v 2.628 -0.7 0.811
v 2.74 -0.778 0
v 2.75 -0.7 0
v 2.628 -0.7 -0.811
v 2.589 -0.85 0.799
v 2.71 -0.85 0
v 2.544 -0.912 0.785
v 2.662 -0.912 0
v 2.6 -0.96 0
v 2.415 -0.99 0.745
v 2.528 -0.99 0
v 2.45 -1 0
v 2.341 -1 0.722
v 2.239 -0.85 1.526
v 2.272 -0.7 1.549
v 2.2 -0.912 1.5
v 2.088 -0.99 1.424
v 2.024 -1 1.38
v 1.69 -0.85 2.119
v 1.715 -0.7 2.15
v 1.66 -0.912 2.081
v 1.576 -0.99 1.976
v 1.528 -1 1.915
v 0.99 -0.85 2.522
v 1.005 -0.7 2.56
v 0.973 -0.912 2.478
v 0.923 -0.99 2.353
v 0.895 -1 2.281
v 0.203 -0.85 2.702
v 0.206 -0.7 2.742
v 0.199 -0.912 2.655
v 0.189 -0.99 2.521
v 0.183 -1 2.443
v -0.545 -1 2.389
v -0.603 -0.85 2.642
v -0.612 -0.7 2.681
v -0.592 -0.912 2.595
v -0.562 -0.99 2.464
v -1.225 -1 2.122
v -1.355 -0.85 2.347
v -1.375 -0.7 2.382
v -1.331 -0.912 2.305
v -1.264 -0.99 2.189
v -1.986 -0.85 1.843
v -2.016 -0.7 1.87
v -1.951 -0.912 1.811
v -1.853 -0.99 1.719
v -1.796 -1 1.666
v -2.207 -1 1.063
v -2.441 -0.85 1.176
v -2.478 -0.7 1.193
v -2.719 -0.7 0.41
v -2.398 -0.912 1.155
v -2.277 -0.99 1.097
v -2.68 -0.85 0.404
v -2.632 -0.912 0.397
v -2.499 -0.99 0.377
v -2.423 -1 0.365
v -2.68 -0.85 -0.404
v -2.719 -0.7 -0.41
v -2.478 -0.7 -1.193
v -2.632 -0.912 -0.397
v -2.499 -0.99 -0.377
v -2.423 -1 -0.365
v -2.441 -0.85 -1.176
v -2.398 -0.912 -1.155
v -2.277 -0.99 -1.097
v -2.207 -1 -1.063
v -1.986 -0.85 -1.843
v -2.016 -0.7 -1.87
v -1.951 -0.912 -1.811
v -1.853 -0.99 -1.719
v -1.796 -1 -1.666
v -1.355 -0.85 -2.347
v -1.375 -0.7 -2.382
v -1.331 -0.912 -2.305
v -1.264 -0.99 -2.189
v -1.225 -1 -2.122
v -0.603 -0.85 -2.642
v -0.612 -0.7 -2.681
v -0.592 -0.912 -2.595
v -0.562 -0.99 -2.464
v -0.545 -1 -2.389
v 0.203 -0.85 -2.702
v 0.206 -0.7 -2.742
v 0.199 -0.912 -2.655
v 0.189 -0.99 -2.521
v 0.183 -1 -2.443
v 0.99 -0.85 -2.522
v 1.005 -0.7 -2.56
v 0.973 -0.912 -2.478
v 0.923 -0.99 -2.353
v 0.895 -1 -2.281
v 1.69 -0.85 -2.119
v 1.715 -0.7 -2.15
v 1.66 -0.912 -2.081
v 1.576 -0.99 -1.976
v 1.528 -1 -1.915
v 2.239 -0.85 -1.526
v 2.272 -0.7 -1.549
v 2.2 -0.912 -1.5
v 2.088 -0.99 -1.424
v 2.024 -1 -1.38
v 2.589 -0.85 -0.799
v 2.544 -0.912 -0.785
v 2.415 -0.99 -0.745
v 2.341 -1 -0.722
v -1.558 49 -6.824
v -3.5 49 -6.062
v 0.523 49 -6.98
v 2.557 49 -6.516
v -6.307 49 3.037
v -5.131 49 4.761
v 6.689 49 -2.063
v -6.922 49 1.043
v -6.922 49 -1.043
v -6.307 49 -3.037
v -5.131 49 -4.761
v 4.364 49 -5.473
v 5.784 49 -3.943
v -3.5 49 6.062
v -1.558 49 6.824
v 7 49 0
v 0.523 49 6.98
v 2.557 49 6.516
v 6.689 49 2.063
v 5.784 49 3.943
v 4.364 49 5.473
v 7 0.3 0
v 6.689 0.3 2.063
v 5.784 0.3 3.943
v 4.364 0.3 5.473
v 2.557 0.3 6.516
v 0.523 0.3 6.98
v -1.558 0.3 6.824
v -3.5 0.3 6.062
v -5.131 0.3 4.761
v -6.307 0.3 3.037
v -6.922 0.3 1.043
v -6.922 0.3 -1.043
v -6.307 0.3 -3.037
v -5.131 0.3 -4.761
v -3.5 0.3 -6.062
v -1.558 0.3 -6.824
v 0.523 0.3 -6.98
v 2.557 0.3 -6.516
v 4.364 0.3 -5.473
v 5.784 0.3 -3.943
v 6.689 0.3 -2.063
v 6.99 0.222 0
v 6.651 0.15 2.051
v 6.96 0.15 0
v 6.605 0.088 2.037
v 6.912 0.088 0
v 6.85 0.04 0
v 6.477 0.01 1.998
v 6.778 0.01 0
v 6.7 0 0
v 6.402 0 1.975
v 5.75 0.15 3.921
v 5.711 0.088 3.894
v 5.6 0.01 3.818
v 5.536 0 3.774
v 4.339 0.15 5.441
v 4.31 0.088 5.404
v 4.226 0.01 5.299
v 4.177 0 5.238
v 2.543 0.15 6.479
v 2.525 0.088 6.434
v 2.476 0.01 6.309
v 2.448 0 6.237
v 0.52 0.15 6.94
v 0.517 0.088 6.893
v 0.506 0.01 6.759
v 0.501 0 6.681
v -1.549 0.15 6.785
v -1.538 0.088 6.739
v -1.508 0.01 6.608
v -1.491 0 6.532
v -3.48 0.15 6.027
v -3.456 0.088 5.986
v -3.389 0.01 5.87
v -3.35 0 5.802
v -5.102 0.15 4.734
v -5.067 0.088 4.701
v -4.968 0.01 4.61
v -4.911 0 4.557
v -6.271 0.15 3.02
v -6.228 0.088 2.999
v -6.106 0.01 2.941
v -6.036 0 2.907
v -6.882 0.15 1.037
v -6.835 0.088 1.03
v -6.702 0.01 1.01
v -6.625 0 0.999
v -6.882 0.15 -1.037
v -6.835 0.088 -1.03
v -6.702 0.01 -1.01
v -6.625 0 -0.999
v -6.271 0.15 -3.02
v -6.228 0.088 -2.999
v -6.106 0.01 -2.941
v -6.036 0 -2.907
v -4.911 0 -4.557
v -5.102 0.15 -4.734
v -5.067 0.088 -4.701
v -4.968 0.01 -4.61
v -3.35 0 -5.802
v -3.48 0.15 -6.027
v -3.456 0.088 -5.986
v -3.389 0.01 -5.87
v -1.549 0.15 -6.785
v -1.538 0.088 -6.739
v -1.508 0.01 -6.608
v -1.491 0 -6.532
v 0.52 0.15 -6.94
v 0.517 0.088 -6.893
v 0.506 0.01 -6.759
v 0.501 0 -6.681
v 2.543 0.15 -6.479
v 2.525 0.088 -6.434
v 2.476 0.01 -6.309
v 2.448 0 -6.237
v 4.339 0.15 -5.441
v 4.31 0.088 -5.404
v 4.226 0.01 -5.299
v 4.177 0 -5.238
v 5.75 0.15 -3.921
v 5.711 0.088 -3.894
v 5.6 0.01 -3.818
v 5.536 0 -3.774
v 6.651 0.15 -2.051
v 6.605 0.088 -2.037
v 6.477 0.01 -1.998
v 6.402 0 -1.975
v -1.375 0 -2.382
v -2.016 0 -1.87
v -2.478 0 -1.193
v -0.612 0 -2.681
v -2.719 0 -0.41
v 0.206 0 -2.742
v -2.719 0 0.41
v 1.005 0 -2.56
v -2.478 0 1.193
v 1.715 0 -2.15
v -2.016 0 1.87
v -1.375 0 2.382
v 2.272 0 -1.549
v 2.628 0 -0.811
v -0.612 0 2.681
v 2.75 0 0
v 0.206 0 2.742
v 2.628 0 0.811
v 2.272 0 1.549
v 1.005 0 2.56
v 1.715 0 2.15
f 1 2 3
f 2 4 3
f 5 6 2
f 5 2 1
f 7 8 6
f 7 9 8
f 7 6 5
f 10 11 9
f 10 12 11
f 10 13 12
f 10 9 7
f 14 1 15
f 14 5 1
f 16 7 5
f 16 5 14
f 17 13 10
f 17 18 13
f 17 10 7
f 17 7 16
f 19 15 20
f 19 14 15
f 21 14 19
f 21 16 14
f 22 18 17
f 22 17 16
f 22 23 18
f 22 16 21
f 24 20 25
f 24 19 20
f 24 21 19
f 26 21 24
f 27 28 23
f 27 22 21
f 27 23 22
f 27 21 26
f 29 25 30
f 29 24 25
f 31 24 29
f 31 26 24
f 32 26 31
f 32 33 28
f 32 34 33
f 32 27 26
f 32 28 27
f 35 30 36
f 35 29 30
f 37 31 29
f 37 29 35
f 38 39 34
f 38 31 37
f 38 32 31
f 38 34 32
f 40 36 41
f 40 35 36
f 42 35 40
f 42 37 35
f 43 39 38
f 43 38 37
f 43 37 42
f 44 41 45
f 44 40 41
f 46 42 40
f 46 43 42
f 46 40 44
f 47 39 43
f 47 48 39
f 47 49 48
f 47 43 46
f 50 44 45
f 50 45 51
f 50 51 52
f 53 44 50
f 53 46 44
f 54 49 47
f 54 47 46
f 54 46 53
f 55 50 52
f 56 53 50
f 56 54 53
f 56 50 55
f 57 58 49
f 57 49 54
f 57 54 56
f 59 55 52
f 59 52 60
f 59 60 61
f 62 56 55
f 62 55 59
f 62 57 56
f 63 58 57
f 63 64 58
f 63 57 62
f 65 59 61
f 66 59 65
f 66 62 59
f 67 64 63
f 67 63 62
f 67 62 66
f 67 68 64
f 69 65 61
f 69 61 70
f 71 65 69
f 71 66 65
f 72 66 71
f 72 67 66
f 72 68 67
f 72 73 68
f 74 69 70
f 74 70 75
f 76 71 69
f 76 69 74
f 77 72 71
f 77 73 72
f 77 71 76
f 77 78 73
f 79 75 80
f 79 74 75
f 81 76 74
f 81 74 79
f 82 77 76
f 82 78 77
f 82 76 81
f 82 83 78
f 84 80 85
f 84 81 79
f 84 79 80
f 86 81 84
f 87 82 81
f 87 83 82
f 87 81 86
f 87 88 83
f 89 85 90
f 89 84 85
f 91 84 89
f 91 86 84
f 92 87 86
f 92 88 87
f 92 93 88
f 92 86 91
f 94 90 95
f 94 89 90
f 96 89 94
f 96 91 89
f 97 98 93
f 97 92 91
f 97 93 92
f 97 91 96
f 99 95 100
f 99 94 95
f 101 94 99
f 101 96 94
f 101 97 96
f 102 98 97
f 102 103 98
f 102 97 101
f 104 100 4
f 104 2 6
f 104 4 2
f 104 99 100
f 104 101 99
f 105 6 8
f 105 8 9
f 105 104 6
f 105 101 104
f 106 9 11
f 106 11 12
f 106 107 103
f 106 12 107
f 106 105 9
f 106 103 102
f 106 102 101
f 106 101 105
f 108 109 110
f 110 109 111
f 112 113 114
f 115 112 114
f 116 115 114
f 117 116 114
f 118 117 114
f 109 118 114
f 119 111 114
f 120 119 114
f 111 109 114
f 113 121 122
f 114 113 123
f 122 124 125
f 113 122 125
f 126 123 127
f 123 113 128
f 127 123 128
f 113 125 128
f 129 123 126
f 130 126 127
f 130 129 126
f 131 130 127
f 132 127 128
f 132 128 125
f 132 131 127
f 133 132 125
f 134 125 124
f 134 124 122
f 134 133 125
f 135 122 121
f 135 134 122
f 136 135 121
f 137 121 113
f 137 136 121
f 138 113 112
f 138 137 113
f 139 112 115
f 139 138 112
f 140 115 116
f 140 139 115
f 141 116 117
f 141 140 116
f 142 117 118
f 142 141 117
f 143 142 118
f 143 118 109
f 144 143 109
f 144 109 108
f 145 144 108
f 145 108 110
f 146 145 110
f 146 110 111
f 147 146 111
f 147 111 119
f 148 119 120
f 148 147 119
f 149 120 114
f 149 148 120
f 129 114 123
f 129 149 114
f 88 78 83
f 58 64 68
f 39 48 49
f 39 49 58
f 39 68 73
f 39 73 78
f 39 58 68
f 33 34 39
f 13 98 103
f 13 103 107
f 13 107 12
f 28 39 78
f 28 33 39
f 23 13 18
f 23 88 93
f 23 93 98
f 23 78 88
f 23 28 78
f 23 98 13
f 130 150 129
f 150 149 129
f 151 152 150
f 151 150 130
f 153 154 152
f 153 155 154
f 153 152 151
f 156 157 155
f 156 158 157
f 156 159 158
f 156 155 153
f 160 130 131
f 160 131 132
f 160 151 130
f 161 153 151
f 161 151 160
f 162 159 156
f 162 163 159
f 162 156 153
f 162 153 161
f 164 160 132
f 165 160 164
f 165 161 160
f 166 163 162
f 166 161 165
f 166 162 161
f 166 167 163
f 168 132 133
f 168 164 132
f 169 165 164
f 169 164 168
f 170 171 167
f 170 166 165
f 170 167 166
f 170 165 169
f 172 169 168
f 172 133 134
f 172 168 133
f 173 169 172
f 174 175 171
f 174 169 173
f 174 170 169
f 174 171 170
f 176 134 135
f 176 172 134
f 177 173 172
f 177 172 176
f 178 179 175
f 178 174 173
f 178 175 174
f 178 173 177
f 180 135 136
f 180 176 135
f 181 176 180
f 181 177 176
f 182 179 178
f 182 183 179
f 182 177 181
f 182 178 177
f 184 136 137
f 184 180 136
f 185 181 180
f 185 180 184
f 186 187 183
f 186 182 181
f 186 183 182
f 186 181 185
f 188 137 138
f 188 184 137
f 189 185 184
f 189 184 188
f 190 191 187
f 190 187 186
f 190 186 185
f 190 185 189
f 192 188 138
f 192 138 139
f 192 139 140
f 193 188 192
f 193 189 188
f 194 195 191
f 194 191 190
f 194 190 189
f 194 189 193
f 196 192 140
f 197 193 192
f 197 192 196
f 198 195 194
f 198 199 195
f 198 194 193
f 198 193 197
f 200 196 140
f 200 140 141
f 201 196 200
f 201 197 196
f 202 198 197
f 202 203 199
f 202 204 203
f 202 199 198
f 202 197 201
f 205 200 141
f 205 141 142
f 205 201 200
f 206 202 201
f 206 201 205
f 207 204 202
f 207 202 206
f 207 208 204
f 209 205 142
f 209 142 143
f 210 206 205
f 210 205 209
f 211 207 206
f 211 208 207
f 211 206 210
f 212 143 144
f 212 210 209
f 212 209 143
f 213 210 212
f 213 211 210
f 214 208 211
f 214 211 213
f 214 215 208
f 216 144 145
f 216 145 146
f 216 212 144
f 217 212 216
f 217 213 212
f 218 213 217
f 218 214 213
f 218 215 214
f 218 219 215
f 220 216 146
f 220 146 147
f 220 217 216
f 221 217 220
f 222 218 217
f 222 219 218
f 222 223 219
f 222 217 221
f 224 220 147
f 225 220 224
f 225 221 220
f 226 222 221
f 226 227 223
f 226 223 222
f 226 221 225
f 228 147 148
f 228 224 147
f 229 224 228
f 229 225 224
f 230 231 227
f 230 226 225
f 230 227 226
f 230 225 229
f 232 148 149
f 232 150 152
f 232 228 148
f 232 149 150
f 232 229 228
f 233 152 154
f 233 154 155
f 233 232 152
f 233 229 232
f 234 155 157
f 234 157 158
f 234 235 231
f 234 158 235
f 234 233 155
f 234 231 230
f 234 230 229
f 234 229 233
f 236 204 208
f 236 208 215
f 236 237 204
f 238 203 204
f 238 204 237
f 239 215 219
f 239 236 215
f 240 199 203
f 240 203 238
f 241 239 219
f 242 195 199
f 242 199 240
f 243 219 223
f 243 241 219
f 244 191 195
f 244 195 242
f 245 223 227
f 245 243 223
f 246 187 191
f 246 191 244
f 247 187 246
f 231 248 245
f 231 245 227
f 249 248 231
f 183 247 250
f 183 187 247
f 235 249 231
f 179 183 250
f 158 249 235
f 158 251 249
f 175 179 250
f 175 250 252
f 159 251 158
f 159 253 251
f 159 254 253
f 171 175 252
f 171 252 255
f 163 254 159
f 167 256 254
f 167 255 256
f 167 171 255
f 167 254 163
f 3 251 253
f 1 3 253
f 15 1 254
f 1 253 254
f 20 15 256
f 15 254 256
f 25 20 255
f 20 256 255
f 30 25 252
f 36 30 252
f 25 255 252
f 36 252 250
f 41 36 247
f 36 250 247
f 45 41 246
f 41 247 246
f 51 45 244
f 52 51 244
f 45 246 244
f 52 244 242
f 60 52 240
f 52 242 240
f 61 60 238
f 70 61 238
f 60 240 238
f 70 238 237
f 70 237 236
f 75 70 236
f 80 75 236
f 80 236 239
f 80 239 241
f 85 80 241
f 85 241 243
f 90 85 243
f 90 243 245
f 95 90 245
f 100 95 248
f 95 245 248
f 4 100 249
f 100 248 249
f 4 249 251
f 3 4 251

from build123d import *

# Parameters (mm, degrees)
F0_R     = 7
F0_R_2   = 2.75
F1_DEPTH = 49
F2_DEPTH = 1
F3_R     = 0.3


with BuildPart() as f1:
    # F0 (on Front) → F1 (new body)
    with BuildSketch(Plane.XZ):
        Circle(F0_R)
        Circle(F0_R_2, mode=Mode.SUBTRACT)
        Circle(F0_R_2)
    extrude(amount=-F1_DEPTH)

    # F0 (on Front) → F2 (join)
    with BuildSketch(Plane.XZ):
        Circle(F0_R_2)
    extrude(amount=F2_DEPTH)

    # F3
    f3_edges = [f1.edges().sort_by_distance(p)[0] for p in [
        (-2.75, -1, 0),
        (-7, 0, 0),
    ]]
    fillet(f3_edges, radius=F3_R)


solid = f1.part
